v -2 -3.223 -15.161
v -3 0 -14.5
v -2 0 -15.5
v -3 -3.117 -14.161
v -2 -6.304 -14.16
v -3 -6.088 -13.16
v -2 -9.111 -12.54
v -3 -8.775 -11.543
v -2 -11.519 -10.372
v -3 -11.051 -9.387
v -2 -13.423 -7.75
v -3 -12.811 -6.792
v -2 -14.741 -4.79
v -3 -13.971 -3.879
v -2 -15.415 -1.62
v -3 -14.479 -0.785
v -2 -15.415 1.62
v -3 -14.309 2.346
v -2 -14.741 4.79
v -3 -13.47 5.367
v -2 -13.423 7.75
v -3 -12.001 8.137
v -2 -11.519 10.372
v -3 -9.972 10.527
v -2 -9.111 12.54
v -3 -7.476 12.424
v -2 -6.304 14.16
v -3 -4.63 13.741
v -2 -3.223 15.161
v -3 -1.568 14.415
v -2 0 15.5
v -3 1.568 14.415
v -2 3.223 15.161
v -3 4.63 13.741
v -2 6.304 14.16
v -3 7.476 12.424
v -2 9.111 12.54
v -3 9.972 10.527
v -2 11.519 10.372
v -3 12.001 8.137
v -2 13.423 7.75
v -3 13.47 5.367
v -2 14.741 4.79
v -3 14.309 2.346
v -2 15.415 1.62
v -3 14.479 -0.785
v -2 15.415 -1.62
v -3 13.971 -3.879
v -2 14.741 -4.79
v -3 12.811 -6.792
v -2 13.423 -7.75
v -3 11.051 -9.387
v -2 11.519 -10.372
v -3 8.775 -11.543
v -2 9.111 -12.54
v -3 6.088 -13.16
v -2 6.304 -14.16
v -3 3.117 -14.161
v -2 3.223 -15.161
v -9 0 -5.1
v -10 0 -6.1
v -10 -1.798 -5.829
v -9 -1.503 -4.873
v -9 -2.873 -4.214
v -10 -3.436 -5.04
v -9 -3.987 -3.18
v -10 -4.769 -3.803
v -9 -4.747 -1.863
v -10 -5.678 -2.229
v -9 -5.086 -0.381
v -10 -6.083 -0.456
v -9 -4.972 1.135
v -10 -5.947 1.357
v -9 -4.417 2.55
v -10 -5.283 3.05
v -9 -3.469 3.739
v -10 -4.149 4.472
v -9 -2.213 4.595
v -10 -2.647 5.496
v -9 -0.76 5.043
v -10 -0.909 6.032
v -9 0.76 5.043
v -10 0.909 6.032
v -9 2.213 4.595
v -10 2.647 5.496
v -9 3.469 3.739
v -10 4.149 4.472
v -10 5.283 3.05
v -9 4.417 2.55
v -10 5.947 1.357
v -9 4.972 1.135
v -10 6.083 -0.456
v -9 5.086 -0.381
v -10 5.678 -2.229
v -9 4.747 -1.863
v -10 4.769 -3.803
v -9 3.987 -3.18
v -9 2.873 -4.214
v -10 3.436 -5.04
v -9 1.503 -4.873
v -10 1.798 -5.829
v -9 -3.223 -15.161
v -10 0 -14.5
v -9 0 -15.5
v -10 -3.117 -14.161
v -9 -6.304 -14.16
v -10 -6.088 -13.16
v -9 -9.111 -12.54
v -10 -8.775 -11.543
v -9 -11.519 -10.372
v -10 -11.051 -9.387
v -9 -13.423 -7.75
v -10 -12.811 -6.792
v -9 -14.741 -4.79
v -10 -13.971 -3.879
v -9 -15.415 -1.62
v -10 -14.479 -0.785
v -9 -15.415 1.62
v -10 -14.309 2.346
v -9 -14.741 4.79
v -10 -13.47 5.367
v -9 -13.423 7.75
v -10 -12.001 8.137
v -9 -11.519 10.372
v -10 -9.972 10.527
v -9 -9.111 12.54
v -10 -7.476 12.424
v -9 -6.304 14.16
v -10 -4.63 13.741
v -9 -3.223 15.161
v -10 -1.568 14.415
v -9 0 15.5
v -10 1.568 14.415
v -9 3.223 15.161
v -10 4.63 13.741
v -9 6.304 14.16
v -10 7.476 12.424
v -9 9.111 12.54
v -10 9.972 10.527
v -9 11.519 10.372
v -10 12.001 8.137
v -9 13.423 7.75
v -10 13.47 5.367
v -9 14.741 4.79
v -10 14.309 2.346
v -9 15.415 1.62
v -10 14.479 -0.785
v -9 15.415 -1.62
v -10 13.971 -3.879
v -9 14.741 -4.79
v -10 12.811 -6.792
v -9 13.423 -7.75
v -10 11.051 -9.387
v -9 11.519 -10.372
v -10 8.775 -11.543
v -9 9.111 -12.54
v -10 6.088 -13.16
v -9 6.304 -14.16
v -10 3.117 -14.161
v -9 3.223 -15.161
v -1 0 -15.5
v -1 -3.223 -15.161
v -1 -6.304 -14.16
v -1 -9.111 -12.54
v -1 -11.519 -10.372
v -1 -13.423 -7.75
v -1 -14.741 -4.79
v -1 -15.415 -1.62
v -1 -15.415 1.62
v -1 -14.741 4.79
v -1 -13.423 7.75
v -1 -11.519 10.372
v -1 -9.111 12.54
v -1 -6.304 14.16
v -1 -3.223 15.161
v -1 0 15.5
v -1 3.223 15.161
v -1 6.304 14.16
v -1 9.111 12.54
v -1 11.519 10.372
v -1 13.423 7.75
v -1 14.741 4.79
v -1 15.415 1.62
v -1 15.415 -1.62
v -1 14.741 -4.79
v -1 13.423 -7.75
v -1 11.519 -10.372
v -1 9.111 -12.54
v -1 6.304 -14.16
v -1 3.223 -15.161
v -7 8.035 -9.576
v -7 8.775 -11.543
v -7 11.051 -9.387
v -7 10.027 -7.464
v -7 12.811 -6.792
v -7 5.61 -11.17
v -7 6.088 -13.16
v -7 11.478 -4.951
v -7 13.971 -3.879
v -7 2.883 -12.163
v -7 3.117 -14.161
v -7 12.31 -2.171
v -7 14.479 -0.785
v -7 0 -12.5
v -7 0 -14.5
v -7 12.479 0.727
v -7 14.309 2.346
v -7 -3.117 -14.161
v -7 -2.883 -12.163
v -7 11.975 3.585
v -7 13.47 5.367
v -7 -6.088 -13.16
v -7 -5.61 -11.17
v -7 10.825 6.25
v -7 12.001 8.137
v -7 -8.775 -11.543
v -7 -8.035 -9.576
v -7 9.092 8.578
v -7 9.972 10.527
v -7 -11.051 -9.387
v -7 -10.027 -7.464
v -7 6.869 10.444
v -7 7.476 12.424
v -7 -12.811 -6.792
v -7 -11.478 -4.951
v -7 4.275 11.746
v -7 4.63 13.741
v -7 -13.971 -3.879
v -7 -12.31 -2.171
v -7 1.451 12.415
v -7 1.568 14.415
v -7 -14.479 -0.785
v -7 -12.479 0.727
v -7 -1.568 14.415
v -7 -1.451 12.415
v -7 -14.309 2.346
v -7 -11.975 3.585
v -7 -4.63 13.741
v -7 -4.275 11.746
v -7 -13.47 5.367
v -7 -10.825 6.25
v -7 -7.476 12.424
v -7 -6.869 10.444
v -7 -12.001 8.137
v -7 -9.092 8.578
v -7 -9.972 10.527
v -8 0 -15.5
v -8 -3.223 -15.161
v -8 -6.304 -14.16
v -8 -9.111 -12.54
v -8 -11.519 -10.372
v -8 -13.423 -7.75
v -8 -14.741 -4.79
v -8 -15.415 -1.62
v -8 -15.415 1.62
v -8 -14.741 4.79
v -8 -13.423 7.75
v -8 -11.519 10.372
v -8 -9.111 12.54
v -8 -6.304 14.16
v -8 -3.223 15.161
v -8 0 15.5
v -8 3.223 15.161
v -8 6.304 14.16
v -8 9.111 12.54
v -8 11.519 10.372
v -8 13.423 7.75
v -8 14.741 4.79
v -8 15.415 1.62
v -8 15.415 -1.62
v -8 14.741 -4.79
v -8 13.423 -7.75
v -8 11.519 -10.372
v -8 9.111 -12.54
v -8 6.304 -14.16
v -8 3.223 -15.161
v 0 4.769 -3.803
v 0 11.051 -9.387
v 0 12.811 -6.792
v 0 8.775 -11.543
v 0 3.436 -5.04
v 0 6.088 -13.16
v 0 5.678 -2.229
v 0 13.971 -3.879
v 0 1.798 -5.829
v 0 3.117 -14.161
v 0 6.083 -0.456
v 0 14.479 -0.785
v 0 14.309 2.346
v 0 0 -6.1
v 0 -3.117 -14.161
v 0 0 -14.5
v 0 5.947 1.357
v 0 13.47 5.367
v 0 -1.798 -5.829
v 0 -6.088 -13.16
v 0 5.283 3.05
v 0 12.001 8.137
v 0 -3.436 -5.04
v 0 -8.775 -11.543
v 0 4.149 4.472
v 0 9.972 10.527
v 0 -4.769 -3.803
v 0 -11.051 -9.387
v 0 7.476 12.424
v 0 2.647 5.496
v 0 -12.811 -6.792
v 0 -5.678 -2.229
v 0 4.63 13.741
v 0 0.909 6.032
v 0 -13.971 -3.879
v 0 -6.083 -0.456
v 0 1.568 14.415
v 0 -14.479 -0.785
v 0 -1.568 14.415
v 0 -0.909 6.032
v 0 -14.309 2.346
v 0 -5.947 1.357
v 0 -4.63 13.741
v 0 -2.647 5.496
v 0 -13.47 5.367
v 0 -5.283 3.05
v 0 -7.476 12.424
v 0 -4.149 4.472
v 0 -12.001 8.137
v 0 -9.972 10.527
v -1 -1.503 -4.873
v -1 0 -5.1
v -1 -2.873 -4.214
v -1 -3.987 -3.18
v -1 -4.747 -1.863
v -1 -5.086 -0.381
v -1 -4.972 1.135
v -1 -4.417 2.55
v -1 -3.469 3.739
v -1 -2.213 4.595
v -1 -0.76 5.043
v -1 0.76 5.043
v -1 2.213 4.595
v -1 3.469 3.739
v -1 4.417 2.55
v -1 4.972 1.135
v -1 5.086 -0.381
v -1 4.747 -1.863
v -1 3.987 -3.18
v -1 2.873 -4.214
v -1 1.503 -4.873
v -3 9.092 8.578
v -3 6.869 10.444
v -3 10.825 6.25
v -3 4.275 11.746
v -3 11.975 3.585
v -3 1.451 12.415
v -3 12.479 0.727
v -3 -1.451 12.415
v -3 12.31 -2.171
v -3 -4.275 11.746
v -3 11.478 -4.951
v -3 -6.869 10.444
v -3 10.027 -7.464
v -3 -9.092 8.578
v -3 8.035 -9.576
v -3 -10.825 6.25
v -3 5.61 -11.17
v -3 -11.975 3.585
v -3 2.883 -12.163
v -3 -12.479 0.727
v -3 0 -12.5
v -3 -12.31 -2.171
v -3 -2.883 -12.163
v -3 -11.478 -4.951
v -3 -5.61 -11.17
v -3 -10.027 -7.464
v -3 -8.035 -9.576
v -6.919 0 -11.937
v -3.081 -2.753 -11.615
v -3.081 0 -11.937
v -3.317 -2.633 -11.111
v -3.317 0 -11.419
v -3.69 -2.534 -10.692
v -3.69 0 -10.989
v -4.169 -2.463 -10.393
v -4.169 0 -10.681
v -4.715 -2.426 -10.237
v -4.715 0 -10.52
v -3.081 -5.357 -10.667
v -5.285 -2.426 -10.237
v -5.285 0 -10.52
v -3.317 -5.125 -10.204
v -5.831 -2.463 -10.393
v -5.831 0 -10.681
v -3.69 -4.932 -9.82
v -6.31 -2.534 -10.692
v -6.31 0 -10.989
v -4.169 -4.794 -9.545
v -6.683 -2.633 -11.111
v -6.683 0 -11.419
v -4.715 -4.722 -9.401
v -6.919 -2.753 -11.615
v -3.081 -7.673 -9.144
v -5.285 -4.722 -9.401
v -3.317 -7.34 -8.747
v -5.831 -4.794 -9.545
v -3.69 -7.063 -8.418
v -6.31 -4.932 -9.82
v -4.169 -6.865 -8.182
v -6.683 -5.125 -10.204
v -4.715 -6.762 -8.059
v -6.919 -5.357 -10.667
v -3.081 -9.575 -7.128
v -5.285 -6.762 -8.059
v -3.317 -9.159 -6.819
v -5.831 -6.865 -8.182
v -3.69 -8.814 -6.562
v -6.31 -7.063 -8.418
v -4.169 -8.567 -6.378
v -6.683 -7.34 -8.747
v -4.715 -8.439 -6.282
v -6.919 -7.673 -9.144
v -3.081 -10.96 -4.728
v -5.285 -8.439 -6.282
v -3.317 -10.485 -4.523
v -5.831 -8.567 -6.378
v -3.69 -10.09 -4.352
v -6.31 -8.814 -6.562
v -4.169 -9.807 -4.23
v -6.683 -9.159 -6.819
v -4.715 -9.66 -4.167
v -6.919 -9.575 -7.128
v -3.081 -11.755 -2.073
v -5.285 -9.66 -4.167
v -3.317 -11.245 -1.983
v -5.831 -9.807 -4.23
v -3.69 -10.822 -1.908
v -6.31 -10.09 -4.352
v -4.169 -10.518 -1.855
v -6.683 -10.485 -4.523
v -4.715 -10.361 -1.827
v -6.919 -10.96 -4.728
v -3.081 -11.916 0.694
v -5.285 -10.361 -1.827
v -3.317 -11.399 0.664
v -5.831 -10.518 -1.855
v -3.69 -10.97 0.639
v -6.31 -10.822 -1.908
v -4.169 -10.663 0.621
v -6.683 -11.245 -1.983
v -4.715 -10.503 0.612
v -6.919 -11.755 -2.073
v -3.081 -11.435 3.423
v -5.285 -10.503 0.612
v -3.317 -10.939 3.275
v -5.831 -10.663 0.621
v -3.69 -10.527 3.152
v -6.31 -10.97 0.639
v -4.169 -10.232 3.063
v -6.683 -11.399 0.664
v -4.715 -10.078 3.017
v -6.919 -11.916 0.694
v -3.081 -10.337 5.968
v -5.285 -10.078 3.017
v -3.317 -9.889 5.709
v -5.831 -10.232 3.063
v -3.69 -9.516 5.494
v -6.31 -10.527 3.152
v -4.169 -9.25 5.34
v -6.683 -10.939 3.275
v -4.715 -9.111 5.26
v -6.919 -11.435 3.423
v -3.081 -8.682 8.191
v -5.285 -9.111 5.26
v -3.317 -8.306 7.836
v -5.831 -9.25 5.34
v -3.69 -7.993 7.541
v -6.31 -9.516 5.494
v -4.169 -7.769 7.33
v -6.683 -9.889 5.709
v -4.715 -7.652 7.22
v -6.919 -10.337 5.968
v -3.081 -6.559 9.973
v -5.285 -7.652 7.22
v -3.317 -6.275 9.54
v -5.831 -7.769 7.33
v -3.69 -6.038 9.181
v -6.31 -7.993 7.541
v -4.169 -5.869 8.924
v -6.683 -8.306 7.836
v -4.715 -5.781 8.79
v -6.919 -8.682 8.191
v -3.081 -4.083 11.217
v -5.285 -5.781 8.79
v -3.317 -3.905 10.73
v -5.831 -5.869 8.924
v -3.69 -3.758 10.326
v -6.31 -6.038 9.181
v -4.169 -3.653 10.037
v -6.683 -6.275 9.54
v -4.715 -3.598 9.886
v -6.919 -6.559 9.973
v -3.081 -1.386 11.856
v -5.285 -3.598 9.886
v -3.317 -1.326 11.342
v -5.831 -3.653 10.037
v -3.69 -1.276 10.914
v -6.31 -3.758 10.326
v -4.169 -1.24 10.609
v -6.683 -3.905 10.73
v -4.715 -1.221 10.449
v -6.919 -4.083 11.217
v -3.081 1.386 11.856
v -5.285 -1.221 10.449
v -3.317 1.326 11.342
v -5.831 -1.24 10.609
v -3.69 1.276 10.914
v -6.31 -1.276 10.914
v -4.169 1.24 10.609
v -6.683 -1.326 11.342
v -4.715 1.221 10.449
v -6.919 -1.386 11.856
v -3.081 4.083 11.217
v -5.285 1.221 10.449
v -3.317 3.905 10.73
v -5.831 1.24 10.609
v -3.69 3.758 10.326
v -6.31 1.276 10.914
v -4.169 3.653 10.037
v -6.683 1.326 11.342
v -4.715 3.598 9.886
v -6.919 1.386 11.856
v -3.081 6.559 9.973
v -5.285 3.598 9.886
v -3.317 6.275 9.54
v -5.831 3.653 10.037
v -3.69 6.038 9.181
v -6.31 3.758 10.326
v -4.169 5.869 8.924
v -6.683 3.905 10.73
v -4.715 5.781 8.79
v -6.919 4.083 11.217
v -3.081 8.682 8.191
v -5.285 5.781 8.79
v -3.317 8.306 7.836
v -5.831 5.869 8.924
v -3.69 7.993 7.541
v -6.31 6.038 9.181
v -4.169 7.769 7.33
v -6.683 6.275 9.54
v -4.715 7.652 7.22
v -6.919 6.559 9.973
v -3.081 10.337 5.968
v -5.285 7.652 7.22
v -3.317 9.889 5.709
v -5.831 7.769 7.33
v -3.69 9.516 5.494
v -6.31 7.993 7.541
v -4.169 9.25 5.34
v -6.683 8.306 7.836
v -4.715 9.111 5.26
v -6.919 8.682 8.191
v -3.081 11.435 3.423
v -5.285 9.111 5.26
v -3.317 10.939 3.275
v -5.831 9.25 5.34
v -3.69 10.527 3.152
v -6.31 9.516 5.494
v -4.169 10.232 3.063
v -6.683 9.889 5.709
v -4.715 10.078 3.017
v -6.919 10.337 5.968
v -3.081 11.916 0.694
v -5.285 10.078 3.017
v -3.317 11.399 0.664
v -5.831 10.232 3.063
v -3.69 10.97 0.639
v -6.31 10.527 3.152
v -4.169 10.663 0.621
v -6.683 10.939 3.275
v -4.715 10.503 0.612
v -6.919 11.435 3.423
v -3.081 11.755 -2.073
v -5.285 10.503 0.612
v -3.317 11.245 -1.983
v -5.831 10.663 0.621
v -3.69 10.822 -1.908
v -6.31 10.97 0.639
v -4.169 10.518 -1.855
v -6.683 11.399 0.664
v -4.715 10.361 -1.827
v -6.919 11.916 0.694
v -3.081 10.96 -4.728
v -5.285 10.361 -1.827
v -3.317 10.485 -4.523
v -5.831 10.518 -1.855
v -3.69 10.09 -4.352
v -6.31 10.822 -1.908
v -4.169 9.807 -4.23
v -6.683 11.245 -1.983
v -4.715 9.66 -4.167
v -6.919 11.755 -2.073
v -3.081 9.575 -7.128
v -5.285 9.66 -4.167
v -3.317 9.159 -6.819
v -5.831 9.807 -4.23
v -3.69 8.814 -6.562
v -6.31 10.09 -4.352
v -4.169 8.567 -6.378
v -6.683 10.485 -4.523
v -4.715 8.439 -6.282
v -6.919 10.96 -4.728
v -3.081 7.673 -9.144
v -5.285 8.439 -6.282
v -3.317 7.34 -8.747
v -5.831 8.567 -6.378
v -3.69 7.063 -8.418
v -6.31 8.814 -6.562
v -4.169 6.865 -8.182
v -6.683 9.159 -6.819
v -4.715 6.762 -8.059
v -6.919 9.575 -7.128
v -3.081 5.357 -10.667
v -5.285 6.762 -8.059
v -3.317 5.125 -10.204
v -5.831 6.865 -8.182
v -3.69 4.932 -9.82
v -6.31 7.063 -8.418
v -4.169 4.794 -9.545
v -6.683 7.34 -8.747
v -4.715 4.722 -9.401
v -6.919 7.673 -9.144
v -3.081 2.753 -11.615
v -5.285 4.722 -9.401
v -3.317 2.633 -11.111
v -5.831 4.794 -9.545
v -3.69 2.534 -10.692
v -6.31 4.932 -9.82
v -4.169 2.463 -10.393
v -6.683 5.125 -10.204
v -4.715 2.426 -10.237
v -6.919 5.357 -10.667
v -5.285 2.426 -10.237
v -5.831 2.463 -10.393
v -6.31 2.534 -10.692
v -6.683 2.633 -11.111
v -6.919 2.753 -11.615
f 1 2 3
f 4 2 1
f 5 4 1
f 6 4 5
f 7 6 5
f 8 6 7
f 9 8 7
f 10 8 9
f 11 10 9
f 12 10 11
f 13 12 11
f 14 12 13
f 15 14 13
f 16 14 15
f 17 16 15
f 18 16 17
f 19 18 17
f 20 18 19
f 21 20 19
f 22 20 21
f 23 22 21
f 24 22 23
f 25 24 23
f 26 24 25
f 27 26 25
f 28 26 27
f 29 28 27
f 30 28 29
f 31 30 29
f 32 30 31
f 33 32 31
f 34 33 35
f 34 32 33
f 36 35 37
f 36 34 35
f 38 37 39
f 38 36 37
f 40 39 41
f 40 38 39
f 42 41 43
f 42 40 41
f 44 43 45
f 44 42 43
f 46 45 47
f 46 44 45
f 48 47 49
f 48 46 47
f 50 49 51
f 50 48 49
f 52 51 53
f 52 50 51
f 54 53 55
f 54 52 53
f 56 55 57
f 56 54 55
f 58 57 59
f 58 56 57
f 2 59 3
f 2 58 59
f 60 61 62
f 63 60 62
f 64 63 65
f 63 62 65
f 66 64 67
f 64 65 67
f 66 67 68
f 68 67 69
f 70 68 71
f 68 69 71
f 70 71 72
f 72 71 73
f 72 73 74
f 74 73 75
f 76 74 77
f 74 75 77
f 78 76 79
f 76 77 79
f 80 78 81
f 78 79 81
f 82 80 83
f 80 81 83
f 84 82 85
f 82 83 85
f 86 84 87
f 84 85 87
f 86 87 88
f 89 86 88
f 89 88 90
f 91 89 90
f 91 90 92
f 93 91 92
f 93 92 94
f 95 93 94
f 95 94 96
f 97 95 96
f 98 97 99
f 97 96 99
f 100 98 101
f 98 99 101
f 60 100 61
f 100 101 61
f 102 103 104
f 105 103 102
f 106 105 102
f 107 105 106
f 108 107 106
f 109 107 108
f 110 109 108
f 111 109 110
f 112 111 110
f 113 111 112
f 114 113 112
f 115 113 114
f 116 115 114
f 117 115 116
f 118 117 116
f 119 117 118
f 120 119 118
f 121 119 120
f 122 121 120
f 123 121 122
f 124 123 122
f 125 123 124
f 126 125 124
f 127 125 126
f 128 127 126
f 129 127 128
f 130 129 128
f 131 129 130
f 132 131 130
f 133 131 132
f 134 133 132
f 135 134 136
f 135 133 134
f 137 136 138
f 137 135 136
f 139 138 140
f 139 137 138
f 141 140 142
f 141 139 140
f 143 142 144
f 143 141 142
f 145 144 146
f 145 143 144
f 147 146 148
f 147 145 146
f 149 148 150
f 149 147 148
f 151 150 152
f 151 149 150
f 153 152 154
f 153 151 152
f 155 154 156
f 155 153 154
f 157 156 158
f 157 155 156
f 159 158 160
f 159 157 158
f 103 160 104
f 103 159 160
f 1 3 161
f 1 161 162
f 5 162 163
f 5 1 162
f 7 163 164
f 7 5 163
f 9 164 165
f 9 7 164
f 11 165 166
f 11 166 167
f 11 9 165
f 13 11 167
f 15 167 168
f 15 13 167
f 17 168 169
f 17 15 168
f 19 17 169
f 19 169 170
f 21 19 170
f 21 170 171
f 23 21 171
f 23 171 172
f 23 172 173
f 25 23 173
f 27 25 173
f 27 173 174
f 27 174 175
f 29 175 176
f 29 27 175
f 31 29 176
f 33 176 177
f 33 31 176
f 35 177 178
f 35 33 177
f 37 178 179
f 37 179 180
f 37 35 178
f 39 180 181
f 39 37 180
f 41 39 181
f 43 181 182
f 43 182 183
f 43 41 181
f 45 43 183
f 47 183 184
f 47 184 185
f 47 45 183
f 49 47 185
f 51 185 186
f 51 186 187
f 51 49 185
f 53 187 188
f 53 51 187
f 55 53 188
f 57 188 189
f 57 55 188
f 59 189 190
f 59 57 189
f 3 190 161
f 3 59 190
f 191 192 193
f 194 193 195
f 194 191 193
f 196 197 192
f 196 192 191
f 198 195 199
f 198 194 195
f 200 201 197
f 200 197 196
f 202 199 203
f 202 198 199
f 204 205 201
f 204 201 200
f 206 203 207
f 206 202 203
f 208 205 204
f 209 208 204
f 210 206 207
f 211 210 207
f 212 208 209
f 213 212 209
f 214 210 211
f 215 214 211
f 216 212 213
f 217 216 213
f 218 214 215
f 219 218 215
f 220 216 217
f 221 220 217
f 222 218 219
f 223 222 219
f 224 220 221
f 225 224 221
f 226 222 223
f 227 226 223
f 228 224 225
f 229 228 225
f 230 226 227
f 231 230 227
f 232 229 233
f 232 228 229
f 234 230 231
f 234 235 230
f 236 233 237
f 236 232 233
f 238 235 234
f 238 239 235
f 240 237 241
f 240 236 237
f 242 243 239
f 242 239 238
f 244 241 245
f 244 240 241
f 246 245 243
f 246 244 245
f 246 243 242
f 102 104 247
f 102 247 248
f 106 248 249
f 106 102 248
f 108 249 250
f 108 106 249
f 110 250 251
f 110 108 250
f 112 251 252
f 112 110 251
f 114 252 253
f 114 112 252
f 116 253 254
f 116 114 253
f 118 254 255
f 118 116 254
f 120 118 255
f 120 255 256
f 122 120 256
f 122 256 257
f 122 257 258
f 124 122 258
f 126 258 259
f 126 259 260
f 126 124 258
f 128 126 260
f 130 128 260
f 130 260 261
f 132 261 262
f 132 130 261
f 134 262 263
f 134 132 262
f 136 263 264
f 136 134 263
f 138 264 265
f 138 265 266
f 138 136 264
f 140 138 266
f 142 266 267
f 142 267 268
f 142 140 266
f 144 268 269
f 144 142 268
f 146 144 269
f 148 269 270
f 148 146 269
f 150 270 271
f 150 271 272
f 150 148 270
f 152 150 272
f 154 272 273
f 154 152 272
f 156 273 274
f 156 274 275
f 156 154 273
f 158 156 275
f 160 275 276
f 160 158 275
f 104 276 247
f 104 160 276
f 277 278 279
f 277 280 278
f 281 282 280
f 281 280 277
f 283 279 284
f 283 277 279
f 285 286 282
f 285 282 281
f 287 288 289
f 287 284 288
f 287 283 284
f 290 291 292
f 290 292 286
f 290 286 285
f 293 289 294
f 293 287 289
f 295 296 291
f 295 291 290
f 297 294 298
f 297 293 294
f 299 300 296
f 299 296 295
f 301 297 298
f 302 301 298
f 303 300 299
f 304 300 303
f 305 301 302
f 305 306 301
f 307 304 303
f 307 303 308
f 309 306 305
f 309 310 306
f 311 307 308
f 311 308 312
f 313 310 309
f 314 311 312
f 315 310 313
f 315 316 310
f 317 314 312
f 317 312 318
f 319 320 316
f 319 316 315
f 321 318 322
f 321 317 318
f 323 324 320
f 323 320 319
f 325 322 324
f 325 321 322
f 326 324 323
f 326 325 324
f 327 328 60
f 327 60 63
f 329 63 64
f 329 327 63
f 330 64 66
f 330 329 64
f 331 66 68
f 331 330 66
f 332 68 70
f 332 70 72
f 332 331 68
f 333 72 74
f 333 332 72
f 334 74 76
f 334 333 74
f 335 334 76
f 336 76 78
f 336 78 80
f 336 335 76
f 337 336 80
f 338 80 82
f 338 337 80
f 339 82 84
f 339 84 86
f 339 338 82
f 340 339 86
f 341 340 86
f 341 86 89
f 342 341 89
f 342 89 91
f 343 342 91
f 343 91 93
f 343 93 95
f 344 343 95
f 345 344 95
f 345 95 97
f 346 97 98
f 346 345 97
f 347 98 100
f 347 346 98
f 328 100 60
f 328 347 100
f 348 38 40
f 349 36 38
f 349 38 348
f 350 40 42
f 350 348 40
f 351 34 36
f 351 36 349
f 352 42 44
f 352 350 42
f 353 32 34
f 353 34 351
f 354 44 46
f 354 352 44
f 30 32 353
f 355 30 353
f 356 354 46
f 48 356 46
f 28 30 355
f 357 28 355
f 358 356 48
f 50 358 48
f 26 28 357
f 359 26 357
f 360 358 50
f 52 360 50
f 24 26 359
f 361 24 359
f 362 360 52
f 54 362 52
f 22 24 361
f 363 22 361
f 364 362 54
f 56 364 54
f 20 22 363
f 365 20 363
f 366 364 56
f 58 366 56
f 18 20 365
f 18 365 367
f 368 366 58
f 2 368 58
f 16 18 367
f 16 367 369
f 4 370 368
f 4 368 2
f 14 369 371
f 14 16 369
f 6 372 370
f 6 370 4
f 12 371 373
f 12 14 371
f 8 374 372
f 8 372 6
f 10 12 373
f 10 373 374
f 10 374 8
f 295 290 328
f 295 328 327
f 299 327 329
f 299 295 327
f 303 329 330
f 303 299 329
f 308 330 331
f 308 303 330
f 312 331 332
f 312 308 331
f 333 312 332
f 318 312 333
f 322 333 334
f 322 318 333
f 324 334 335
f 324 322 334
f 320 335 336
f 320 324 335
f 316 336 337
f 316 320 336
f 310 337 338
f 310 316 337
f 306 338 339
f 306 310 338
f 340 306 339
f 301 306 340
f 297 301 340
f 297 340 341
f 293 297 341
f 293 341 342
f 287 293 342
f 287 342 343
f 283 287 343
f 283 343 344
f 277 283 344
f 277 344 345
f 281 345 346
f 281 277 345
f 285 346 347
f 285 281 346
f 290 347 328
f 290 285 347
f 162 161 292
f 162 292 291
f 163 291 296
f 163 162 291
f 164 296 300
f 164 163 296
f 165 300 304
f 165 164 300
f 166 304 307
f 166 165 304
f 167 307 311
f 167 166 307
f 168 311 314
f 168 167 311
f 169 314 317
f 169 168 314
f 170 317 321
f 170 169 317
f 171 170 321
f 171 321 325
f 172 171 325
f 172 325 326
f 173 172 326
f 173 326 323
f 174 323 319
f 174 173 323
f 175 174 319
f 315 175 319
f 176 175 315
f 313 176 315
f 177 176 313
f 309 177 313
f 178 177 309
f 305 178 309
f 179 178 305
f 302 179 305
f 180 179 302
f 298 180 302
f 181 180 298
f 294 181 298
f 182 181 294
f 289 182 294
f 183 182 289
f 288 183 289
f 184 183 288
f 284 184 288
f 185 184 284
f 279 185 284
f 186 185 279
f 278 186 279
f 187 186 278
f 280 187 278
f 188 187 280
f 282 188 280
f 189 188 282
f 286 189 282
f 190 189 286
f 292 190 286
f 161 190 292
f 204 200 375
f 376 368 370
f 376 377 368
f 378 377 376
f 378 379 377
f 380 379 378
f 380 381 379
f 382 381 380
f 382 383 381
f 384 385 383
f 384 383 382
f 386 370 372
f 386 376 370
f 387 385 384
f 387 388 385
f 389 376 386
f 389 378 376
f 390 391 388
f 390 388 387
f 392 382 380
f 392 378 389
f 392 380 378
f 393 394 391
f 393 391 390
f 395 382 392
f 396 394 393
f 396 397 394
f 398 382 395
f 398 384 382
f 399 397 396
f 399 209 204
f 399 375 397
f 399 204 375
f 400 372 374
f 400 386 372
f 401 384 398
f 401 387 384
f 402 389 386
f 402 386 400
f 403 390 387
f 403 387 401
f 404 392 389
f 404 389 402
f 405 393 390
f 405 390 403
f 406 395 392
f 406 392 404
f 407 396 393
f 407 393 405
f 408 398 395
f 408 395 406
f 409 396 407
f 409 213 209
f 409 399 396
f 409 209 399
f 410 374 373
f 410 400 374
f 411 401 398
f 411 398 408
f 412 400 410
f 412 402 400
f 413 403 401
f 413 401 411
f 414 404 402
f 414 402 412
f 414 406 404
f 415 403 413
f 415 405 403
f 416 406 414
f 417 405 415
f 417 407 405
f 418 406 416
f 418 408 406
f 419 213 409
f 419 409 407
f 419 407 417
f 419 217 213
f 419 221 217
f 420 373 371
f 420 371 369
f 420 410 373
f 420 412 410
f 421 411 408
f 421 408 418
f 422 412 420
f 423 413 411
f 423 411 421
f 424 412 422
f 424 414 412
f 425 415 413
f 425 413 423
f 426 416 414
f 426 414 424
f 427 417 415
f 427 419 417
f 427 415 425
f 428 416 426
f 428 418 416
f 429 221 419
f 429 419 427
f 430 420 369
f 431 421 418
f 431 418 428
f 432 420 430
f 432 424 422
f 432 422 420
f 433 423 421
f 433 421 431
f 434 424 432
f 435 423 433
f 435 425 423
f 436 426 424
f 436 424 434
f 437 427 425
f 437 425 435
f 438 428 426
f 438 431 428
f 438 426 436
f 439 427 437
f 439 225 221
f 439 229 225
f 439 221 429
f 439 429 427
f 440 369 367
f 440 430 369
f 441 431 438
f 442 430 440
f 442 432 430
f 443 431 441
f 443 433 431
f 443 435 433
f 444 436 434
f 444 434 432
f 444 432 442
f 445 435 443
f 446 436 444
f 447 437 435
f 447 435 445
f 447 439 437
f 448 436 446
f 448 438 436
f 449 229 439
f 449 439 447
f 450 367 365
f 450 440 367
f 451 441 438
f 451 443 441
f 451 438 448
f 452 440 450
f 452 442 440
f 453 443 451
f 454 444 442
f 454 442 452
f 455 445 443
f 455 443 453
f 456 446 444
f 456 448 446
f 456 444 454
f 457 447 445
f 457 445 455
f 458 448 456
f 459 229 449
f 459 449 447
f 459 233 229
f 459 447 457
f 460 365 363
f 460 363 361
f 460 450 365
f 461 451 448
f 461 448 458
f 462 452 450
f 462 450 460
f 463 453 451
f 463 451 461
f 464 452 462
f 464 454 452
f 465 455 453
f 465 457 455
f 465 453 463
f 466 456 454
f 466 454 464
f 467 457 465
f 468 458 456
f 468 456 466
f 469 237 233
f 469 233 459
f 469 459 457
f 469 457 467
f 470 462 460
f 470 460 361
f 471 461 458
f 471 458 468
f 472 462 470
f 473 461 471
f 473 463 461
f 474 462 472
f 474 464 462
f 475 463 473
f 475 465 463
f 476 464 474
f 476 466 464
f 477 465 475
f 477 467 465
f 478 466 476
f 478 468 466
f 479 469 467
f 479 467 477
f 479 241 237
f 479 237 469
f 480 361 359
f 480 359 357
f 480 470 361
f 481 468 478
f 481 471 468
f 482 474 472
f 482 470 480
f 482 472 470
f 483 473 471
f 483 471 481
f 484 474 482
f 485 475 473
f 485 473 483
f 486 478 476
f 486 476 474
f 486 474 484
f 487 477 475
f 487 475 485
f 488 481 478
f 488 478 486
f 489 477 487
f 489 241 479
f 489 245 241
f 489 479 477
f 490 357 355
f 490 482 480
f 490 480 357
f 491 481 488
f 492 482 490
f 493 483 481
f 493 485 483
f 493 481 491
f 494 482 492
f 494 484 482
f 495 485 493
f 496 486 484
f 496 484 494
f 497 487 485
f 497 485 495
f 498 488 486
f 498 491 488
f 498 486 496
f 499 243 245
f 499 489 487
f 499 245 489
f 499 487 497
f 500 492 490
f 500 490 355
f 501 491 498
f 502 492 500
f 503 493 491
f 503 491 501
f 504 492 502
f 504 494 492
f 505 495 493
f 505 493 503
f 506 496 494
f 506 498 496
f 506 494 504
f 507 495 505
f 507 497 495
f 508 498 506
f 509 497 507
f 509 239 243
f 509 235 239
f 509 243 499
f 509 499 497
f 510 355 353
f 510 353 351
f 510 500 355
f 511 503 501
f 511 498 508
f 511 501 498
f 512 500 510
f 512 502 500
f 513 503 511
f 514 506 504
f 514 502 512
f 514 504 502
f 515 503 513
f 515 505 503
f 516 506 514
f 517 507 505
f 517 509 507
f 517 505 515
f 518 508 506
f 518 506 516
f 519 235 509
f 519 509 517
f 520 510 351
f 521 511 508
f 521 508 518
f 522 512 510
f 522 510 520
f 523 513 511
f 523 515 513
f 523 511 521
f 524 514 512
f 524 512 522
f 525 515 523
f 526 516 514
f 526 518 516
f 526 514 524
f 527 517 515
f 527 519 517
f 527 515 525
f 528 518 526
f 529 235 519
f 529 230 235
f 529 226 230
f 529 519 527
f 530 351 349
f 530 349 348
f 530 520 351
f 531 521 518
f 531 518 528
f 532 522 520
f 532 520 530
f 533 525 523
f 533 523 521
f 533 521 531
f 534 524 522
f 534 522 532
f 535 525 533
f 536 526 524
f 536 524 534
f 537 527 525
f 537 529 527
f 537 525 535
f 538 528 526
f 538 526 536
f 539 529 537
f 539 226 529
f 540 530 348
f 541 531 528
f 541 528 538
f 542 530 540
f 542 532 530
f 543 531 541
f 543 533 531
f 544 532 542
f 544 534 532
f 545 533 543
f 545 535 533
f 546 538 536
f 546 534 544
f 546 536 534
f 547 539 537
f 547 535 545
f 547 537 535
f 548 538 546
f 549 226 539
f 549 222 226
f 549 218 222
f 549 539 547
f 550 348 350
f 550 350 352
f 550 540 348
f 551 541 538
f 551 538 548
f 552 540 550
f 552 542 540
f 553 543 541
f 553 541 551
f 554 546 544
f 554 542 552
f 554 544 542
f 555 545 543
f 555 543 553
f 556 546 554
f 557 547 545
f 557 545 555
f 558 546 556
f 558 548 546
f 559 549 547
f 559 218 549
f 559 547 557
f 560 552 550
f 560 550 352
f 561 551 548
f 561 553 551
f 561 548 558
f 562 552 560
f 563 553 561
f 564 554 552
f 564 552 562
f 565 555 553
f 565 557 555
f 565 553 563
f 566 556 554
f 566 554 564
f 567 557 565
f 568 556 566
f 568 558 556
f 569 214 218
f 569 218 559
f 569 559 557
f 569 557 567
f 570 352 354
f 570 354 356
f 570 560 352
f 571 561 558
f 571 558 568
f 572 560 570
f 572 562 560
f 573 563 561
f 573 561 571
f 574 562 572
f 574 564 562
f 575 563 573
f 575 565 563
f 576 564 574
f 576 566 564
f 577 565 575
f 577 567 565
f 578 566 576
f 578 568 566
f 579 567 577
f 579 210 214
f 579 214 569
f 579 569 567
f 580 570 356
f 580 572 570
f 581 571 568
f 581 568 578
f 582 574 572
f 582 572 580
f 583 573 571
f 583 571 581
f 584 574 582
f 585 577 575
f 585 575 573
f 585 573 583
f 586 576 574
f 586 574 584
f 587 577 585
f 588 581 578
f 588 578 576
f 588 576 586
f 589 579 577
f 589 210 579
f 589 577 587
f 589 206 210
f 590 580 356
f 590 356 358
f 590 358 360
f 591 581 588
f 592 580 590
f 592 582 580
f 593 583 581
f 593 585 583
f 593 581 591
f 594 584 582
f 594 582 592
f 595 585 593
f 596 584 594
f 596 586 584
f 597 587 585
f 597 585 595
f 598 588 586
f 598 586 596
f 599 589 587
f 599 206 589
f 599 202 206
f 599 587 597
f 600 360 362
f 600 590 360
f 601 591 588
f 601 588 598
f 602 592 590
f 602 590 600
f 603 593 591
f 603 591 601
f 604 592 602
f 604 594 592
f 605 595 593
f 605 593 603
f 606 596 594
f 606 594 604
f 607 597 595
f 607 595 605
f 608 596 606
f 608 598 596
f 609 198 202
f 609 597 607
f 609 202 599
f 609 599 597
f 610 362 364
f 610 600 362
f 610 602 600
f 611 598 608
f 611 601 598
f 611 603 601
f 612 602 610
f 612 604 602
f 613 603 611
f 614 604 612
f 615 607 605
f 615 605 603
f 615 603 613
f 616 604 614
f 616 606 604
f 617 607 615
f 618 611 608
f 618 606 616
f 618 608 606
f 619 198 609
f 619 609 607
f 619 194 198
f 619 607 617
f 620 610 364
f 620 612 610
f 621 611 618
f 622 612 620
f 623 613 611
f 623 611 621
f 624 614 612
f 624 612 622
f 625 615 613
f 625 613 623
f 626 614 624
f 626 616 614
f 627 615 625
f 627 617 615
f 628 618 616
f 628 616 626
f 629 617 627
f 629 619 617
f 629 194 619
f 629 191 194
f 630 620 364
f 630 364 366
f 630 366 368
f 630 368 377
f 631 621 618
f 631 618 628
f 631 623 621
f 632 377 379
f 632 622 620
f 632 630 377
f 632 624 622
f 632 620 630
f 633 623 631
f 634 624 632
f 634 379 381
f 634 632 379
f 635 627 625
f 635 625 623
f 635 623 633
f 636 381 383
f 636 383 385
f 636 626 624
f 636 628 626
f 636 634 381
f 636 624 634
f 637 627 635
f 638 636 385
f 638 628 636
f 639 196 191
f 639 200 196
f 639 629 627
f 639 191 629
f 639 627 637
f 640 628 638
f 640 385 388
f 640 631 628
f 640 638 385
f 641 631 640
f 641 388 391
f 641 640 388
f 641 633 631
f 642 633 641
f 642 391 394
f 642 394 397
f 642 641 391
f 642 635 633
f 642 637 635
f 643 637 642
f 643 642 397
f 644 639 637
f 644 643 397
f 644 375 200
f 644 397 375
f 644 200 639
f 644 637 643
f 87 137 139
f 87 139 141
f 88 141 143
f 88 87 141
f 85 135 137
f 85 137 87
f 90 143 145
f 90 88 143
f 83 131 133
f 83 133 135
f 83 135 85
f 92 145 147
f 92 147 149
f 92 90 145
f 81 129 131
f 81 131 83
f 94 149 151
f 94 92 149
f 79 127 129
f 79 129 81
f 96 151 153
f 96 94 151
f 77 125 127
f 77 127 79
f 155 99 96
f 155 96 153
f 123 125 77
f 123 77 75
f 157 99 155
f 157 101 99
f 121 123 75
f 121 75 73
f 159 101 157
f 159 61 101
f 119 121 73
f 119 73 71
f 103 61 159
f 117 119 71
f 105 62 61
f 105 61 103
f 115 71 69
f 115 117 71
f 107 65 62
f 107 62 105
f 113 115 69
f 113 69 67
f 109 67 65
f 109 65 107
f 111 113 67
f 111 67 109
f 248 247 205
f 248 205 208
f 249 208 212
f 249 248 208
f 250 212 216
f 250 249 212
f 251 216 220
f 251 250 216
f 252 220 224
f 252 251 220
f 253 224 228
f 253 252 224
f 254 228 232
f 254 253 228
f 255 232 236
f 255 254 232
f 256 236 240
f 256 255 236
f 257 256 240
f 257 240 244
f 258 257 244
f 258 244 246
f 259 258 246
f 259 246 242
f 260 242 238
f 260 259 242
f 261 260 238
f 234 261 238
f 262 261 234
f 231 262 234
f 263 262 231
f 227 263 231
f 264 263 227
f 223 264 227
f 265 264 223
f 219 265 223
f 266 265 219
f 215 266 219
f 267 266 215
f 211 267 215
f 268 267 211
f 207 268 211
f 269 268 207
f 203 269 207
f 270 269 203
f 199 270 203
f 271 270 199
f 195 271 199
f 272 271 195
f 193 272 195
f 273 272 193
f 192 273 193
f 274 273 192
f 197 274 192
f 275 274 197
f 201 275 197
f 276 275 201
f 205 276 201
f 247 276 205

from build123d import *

# Parameters (mm, degrees)
CHANFREIN1_SIZE = 1


with BuildPart() as part:
    # Esquisse1 → Révolution1 (revolve)
    with BuildSketch(Plane(origin=(0, 0, 0), x_dir=(0, 1, 0), z_dir=(0, 0, 1)), mode=Mode.PRIVATE) as r_volution1_sk:
        with BuildLine():
            Line((5.1, 10), (5.1, 0))
            Line((5.1, 0), (15.5, 0))
            Line((15.5, 0), (15.5, 3))
            Line((15.5, 3), (12.5, 3))
            ThreePointArc((12.5, 3), (10.5, 5), (12.5, 7))
            Line((12.5, 7), (15.5, 7))
            Line((15.5, 7), (15.5, 10))
            Line((15.5, 10), (5.1, 10))
        make_face()
    revolve(r_volution1_sk.sketch.rotate(Axis((0, 0, 0), (-1, 0, 0)), 90), axis=Axis((0, 0, 0), (-1, 0, 0)))

    # Chanfrein1
    chanfrein1_edges = [part.edges().sort_by_distance(p)[0] for p in [
        (-10, 0, 15.5),
        (-7, 0, 15.5),
        (-3, 0, 15.5),
        (0, 0, 15.5),
        (0, 0, 5.1),
        (-10, 0, 5.1),
    ]]
    chamfer(chanfrein1_edges, length=CHANFREIN1_SIZE)


solid = part.part
